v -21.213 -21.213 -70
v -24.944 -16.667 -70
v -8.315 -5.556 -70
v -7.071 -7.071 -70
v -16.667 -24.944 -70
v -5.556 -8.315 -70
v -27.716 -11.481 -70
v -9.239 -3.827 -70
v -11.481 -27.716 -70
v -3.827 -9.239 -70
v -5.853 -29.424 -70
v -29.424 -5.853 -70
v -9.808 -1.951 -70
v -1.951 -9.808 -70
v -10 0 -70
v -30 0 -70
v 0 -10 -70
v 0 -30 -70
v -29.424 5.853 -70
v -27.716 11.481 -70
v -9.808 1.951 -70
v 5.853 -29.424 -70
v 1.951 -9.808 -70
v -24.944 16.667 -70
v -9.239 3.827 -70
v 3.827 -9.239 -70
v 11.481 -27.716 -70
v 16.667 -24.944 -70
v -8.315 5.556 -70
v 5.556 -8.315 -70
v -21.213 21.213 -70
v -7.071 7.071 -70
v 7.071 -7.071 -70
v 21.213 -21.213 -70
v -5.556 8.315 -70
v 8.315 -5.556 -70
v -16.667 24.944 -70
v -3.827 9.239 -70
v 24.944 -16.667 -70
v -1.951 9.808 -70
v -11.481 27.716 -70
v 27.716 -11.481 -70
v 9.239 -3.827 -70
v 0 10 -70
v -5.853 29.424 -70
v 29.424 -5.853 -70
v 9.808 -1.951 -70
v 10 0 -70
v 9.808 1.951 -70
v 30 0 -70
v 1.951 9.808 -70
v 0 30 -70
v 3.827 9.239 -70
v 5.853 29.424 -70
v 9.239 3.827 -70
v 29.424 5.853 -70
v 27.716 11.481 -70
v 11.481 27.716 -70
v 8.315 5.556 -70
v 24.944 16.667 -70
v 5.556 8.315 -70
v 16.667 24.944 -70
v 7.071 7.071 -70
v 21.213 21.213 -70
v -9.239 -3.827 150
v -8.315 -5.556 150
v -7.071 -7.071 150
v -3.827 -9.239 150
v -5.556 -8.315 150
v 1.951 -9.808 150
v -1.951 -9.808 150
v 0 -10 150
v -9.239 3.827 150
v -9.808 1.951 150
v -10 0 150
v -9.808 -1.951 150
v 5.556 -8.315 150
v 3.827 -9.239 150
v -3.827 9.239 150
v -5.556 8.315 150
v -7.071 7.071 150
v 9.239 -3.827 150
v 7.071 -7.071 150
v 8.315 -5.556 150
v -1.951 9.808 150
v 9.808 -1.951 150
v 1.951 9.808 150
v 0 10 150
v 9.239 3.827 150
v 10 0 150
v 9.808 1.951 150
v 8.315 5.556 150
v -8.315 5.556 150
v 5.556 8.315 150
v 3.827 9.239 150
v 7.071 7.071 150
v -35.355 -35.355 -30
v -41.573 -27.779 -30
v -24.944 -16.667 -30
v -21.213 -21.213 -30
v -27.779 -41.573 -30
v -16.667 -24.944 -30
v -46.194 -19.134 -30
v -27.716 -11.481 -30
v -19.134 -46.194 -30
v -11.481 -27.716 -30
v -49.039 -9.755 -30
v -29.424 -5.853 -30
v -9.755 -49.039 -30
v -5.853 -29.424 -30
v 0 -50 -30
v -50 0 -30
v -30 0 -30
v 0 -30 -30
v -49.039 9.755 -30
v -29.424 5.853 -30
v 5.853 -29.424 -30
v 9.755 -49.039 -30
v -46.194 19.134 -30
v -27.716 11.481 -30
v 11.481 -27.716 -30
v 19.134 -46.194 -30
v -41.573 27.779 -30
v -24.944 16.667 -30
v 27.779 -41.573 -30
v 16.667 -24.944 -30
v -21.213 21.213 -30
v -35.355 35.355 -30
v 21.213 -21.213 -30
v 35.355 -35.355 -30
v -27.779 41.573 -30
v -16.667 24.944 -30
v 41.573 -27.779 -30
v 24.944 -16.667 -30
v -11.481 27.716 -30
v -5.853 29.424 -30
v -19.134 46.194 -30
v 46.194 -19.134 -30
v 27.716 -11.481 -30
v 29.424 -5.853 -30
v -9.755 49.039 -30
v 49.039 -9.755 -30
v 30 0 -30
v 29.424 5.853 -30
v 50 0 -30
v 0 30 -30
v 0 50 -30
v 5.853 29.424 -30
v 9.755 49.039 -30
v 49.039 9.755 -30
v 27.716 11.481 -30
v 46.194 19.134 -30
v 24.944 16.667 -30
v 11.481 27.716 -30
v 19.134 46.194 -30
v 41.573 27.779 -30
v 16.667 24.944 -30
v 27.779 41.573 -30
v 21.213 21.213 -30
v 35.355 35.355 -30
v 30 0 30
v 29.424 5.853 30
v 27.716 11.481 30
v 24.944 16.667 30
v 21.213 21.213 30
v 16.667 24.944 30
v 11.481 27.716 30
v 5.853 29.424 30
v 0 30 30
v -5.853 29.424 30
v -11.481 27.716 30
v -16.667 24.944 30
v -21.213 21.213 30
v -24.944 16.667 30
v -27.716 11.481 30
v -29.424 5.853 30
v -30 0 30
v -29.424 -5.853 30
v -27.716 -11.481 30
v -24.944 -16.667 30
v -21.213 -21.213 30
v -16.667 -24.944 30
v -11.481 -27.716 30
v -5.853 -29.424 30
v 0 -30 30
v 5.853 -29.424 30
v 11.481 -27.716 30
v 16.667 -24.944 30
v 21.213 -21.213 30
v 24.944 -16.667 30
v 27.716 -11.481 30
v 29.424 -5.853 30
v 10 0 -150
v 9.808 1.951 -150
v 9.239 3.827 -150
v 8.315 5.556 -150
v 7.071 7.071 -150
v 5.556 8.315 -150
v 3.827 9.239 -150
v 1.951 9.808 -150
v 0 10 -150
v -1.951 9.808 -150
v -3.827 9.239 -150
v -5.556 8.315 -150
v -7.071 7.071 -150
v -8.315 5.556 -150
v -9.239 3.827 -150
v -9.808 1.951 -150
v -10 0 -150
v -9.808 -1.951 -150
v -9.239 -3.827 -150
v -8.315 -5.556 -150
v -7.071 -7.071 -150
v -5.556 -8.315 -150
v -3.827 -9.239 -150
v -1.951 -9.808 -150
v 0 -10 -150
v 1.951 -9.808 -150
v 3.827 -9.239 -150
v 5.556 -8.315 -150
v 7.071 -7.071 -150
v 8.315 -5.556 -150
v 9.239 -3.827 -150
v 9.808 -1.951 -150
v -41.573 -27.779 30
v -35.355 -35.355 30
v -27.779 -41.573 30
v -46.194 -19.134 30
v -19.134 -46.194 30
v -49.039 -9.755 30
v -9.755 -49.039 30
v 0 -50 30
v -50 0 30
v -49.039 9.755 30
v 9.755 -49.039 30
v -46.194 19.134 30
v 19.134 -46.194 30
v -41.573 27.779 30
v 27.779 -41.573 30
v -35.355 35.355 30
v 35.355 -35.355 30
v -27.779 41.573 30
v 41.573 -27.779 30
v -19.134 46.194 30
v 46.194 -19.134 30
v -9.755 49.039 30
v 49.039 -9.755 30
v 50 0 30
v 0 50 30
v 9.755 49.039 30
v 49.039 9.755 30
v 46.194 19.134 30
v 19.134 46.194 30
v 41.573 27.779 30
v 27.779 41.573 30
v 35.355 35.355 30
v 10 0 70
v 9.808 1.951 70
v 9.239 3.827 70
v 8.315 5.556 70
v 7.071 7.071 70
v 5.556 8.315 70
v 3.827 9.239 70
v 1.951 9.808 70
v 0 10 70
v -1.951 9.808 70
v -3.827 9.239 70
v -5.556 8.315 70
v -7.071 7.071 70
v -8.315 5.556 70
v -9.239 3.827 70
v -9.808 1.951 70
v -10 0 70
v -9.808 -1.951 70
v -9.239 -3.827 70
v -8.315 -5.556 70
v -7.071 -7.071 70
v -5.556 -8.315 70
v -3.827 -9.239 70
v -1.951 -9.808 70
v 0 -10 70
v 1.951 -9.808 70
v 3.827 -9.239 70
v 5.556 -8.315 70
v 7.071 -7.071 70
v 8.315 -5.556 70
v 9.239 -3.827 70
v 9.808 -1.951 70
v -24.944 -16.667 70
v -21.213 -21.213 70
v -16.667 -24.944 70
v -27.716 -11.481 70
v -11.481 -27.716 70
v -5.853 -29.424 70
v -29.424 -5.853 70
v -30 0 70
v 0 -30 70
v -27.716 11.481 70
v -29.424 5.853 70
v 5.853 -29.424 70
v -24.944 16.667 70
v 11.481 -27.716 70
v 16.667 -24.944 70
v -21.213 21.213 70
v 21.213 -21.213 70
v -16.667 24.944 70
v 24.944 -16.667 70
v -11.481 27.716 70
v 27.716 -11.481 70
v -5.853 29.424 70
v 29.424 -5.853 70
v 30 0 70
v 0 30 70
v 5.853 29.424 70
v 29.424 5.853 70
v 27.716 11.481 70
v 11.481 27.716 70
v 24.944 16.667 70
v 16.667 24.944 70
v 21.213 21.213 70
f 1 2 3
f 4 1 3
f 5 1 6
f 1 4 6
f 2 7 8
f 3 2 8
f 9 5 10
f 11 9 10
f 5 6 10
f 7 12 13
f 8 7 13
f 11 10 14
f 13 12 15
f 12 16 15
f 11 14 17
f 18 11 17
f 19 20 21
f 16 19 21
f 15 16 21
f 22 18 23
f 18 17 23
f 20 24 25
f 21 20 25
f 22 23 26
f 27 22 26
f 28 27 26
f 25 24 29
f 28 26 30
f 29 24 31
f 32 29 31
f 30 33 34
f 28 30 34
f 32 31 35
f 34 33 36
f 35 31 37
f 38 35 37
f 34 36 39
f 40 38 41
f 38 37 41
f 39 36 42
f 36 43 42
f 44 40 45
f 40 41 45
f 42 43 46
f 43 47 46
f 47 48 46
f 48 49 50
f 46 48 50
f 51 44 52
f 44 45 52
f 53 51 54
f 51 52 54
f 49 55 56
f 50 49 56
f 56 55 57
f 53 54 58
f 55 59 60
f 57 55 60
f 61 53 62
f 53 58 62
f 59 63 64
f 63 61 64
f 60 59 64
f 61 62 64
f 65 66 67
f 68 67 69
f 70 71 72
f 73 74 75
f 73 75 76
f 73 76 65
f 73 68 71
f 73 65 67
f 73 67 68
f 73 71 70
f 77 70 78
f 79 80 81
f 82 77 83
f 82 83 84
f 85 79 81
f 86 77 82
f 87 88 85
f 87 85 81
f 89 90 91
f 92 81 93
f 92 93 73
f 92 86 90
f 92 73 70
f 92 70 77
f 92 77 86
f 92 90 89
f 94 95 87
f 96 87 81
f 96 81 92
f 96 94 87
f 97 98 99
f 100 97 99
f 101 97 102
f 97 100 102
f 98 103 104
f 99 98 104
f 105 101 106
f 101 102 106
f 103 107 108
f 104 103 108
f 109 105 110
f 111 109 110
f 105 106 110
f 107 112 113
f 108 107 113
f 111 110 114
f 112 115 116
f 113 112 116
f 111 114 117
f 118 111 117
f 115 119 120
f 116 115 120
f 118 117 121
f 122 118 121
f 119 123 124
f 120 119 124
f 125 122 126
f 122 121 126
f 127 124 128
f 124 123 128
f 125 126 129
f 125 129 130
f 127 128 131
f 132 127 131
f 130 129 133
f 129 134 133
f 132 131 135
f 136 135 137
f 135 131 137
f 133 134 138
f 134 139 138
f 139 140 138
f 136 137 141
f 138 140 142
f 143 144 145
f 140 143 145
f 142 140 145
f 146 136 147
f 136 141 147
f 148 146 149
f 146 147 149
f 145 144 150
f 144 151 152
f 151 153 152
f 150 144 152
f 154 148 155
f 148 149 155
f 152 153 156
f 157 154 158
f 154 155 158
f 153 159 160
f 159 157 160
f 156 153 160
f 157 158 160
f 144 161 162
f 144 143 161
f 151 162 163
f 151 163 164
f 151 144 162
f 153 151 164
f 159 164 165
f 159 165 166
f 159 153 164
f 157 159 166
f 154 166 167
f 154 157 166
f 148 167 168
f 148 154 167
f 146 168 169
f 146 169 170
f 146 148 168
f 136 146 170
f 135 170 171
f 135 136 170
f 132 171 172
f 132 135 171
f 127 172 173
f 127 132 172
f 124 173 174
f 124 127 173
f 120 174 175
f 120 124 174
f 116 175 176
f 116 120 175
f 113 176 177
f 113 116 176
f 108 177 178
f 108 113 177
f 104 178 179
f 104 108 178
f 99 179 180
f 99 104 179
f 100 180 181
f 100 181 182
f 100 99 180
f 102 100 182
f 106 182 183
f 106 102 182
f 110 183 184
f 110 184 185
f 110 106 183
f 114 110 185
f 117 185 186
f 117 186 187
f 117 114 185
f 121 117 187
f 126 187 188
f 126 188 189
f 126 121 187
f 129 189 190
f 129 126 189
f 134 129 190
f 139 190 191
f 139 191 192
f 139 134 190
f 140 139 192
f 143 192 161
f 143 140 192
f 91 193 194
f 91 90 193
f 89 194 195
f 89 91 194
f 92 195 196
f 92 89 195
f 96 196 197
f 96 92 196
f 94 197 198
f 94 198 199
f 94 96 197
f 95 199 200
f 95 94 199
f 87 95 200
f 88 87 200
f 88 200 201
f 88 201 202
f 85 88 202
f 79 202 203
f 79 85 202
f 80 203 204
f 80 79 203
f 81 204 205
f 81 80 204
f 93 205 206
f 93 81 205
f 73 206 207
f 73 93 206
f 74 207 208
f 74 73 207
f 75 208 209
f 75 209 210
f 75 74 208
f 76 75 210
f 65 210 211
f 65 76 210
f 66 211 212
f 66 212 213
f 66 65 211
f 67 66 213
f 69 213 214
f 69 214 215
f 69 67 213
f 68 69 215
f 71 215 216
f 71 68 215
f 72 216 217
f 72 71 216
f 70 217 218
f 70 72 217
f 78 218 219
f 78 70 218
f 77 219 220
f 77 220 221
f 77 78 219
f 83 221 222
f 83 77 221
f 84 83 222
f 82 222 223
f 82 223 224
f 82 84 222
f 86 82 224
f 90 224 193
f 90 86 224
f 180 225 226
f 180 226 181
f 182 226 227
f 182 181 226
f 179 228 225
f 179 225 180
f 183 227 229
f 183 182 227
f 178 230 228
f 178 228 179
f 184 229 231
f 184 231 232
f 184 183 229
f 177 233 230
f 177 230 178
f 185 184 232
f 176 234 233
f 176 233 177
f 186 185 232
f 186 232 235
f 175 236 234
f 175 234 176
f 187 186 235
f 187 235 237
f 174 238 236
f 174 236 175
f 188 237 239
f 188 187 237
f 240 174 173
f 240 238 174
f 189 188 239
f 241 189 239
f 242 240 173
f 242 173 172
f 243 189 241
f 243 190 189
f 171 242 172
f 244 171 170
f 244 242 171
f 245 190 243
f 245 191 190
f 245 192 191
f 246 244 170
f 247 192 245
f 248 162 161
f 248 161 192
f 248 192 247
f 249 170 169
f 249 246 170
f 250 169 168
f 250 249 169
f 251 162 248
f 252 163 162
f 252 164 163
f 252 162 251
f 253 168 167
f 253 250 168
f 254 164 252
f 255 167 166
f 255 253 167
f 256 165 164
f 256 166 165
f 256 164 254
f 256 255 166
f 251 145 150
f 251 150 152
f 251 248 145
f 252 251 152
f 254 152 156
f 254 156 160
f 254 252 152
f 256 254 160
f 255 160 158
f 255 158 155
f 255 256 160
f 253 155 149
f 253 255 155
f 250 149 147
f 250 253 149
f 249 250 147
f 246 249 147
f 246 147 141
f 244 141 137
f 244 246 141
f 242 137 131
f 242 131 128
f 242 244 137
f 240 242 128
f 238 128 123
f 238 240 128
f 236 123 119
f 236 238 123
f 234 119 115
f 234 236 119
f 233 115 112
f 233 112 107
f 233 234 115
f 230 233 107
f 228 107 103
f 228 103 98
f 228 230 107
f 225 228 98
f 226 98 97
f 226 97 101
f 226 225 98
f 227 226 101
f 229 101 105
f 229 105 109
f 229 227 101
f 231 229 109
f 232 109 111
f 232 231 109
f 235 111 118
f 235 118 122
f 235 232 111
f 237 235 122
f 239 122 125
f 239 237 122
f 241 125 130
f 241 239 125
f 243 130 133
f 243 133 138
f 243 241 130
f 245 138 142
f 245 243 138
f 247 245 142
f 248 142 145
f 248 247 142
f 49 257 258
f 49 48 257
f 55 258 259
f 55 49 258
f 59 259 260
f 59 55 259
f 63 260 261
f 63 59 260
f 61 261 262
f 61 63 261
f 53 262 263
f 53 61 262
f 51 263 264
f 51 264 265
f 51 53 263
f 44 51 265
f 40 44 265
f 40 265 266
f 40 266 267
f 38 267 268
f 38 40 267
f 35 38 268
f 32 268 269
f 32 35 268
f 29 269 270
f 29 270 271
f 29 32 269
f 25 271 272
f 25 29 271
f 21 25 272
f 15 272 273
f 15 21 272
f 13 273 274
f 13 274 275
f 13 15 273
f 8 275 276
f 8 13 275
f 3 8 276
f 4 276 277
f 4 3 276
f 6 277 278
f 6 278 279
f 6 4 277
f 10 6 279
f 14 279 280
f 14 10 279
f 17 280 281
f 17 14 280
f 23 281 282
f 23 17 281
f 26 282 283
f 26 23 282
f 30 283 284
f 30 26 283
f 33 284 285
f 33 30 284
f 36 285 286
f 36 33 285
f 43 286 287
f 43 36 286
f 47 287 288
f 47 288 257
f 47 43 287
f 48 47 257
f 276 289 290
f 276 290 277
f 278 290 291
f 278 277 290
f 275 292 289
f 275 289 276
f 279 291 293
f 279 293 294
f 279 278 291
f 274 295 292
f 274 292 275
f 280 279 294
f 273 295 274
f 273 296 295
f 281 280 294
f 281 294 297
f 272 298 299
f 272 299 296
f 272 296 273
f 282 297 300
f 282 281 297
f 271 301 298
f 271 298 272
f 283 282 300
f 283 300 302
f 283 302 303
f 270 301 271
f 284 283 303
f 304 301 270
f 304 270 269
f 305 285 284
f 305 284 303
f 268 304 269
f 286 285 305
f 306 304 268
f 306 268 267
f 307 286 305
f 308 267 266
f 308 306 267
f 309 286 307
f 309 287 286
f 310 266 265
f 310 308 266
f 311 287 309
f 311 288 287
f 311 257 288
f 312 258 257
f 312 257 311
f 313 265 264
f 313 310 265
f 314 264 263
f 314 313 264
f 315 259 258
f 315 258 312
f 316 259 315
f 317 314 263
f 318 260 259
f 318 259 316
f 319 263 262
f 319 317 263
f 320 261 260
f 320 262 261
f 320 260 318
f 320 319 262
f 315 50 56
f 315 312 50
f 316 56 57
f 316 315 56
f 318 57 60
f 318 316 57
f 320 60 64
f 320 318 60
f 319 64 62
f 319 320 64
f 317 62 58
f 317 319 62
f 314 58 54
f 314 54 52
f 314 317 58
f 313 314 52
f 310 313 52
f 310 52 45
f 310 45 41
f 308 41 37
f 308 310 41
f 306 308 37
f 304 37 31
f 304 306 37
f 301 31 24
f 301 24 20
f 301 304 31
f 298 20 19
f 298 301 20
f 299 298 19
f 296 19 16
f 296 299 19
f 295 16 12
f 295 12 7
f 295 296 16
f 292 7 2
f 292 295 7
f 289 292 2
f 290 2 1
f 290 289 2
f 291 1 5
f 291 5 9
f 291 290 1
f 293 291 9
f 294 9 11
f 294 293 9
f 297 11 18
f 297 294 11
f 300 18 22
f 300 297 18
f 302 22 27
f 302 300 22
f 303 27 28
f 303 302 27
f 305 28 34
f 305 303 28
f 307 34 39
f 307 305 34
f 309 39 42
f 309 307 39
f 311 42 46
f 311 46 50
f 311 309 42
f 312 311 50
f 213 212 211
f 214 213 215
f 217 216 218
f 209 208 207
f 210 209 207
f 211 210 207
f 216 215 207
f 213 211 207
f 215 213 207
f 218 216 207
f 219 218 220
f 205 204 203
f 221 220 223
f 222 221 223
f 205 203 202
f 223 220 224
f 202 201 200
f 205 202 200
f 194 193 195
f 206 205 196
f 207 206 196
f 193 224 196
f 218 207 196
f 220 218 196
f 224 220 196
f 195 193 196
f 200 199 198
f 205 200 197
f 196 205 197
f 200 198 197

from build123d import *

# Parameters (mm, degrees)
F0_R     = 10
F1_DEPTH = 150
F0_R_2   = 50
F0_R_3   = 30
F2_DEPTH = 30
F3_DEPTH = 70


with BuildPart() as f1:
    # F0 (on Top) → F1 (new body, symmetric)
    with BuildSketch(Plane.XY):
        Circle(F0_R)
    extrude(amount=F1_DEPTH, both=True)


with BuildPart() as f2:
    # F0 (on Top) → F2 (new body, symmetric)
    with BuildSketch(Plane.XY):
        Circle(F0_R_2)
        Circle(F0_R_3, mode=Mode.SUBTRACT)
    extrude(amount=F2_DEPTH, both=True)


with BuildPart() as f3:
    # F0 (on Top) → F3 (new body, symmetric)
    with BuildSketch(Plane.XY):
        Circle(F0_R_3)
        Circle(F0_R, mode=Mode.SUBTRACT)
    extrude(amount=F3_DEPTH, both=True)


solid = Compound([f1.part, f2.part, f3.part])
